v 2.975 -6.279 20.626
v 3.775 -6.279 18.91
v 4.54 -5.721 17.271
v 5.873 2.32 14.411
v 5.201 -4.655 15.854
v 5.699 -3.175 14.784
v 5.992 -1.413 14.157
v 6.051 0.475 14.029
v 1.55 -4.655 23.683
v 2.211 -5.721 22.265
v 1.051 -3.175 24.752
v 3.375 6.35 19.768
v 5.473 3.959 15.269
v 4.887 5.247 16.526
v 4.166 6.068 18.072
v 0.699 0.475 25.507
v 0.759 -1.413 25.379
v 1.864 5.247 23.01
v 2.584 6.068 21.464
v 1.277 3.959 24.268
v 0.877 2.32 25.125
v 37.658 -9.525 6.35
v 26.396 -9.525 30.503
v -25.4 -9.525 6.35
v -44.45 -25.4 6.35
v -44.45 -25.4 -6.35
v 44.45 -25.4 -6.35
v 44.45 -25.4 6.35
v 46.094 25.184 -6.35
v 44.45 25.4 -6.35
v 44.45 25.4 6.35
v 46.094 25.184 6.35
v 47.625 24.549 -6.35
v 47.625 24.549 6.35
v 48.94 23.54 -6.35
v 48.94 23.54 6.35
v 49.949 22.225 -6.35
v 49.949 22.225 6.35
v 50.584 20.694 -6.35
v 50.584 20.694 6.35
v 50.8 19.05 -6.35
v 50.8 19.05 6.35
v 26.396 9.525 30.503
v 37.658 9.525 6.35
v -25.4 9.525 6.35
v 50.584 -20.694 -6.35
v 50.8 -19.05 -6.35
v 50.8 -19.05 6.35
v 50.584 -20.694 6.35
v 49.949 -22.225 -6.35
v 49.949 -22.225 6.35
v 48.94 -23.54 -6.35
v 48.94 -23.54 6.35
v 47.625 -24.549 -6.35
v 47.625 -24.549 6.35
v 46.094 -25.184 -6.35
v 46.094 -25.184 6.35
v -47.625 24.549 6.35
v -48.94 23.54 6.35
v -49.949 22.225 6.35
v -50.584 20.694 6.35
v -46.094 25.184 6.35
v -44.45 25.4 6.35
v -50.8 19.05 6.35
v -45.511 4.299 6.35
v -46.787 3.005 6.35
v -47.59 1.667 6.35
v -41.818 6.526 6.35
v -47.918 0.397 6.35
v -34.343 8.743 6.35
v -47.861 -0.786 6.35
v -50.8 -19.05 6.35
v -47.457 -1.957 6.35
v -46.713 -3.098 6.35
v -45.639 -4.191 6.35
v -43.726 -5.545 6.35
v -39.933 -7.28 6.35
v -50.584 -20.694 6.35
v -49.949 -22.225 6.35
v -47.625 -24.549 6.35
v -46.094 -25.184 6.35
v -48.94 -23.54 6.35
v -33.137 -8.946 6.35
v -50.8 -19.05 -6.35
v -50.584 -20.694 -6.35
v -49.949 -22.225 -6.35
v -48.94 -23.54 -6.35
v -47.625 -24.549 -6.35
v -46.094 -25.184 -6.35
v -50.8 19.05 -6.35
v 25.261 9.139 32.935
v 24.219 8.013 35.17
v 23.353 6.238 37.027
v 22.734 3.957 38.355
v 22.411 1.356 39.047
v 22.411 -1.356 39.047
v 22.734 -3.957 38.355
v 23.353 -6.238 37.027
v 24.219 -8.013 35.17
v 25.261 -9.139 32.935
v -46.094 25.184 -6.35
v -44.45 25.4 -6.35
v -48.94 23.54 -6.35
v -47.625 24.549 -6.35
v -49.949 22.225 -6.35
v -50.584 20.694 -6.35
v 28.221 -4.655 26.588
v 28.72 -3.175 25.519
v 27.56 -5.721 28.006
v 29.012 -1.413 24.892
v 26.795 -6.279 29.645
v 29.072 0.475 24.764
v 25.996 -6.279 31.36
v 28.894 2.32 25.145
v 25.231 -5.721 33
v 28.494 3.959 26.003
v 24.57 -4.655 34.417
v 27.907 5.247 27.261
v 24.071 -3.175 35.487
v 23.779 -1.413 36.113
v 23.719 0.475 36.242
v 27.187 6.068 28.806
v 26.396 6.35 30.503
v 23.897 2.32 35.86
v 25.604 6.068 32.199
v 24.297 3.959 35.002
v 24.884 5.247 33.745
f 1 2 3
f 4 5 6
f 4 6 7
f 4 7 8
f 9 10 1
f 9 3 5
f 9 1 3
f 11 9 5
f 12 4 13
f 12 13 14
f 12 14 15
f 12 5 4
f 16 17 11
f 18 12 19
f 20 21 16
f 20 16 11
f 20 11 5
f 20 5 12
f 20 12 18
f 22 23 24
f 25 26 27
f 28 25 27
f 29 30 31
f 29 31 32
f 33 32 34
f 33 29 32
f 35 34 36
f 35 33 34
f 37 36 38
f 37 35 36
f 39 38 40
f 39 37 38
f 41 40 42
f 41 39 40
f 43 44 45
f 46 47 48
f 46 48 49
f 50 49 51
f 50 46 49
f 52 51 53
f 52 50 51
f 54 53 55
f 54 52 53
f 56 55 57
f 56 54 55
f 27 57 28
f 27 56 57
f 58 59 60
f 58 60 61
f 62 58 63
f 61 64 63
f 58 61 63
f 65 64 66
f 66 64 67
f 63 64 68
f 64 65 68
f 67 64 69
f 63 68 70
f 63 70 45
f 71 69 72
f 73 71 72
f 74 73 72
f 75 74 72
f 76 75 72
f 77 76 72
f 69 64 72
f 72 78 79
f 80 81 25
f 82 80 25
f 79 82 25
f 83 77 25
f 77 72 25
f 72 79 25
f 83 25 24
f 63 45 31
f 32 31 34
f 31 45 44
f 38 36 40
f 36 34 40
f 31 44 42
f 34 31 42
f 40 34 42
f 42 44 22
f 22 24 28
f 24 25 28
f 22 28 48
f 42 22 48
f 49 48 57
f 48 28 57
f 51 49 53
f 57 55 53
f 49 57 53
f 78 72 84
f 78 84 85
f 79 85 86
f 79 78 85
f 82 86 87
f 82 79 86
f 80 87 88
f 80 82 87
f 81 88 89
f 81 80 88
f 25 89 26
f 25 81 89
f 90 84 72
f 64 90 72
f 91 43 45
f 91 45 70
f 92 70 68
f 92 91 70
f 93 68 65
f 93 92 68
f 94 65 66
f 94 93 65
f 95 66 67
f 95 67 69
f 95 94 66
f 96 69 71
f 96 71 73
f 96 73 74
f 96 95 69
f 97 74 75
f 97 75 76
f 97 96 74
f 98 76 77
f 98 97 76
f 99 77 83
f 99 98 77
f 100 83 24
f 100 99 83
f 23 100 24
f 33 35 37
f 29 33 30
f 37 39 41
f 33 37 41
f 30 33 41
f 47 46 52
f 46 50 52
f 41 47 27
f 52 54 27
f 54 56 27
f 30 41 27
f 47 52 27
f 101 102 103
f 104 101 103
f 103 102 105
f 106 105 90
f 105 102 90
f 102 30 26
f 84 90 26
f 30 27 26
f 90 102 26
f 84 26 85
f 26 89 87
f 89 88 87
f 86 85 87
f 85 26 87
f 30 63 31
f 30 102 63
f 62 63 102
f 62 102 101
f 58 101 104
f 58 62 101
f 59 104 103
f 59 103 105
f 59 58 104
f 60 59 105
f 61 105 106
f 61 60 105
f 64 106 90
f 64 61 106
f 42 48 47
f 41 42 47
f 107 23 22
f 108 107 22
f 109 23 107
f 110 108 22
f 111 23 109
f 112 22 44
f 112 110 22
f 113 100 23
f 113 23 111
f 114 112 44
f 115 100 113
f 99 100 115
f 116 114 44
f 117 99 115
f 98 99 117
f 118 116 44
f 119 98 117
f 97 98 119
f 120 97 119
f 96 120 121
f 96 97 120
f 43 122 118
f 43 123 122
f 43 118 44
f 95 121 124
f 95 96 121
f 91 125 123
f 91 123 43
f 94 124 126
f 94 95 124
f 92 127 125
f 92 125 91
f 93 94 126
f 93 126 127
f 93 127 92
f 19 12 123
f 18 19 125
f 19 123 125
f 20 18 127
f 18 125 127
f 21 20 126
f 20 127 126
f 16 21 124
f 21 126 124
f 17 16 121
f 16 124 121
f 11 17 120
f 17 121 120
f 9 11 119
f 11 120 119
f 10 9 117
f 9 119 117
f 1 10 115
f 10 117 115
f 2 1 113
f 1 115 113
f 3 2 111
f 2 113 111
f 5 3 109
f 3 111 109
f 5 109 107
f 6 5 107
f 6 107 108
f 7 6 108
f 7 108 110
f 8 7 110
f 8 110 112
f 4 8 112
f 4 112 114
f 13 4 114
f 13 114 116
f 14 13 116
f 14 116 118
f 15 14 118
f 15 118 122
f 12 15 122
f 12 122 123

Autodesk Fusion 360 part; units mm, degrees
sketch "Sketch1" plane through (0, 0, 0) normal (0, 1, 0) x (1, 0, 0)
  line L0 (50.8, 6.35) -> (-50.8, 6.35)
  line L1 (-50.8, 6.35) -> (-50.8, -6.35)
  line L2 (-50.8, -6.35) -> (50.8, -6.35)
  line L3 (50.8, -6.35) -> (50.8, 6.35)
  line L4 (50.8, 6.35) -> (-50.8, -6.35) construction
  line L5 (-50.8, 6.35) -> (50.8, -6.35) construction
  dimension "d1" = 101.6
  dimension "d2" = 12.7
extrude "Extrude1" add sketch "Sketch1" along normal mid plane 50.8
sketch "Sketch2" plane through (0, 0, 0) normal (0, 1, 0) x (1, 0, 0)
  line L0 (50.8, -6.35) -> (-50.8, -6.35)
  line L1 (-25.4, -6.35) -> (26.3955, -30.5026)
  dimension "d5" = 25.4
  dimension "d6" = 25
  dimension "d7" = 57.15
ref_plane "WorkPlane1" through (26.3955, 0, 30.5026) normal (0.9063, 0, 0.4226) x (0, 1, 0)
sketch "Sketch3" plane through (26.3955, 0, 30.5026) normal (0.9063, 0, 0.4226) x (0, 1, 0)
  circle A0 centre (0, 0) radius 6.35
  circle A1 centre (0, 0) radius 9.525
  line L0 (-9.525, 0) -> (-9.525, -26.6495)
  line L1 (-9.525, -26.6495) -> (9.525, -26.6495)
  line L2 (9.525, -26.6495) -> (9.525, 0)
  line L3 (25.4, -26.6495) -> (-25.4, -26.6495)
  dimension "d9" = 12.7
  dimension "d10" = 19.05
extrude "Extrude2" add sketch "Sketch3" along normal up to surface contours A0 | A1 | A1 L0 L1 L2 L3 end surface through (-50.8, 0, 6.35) normal (0, 0, 1) offset 0
extrude "Extrude3" cut sketch "Sketch3" against normal blind 25.4 contours A0
fillet "Fillet1" radius 6.35 4 edges at (-50.8, -25.4, 0) (-50.8, 25.4, 0) (50.8, 25.4, 0) (50.8, -25.4, 0)
